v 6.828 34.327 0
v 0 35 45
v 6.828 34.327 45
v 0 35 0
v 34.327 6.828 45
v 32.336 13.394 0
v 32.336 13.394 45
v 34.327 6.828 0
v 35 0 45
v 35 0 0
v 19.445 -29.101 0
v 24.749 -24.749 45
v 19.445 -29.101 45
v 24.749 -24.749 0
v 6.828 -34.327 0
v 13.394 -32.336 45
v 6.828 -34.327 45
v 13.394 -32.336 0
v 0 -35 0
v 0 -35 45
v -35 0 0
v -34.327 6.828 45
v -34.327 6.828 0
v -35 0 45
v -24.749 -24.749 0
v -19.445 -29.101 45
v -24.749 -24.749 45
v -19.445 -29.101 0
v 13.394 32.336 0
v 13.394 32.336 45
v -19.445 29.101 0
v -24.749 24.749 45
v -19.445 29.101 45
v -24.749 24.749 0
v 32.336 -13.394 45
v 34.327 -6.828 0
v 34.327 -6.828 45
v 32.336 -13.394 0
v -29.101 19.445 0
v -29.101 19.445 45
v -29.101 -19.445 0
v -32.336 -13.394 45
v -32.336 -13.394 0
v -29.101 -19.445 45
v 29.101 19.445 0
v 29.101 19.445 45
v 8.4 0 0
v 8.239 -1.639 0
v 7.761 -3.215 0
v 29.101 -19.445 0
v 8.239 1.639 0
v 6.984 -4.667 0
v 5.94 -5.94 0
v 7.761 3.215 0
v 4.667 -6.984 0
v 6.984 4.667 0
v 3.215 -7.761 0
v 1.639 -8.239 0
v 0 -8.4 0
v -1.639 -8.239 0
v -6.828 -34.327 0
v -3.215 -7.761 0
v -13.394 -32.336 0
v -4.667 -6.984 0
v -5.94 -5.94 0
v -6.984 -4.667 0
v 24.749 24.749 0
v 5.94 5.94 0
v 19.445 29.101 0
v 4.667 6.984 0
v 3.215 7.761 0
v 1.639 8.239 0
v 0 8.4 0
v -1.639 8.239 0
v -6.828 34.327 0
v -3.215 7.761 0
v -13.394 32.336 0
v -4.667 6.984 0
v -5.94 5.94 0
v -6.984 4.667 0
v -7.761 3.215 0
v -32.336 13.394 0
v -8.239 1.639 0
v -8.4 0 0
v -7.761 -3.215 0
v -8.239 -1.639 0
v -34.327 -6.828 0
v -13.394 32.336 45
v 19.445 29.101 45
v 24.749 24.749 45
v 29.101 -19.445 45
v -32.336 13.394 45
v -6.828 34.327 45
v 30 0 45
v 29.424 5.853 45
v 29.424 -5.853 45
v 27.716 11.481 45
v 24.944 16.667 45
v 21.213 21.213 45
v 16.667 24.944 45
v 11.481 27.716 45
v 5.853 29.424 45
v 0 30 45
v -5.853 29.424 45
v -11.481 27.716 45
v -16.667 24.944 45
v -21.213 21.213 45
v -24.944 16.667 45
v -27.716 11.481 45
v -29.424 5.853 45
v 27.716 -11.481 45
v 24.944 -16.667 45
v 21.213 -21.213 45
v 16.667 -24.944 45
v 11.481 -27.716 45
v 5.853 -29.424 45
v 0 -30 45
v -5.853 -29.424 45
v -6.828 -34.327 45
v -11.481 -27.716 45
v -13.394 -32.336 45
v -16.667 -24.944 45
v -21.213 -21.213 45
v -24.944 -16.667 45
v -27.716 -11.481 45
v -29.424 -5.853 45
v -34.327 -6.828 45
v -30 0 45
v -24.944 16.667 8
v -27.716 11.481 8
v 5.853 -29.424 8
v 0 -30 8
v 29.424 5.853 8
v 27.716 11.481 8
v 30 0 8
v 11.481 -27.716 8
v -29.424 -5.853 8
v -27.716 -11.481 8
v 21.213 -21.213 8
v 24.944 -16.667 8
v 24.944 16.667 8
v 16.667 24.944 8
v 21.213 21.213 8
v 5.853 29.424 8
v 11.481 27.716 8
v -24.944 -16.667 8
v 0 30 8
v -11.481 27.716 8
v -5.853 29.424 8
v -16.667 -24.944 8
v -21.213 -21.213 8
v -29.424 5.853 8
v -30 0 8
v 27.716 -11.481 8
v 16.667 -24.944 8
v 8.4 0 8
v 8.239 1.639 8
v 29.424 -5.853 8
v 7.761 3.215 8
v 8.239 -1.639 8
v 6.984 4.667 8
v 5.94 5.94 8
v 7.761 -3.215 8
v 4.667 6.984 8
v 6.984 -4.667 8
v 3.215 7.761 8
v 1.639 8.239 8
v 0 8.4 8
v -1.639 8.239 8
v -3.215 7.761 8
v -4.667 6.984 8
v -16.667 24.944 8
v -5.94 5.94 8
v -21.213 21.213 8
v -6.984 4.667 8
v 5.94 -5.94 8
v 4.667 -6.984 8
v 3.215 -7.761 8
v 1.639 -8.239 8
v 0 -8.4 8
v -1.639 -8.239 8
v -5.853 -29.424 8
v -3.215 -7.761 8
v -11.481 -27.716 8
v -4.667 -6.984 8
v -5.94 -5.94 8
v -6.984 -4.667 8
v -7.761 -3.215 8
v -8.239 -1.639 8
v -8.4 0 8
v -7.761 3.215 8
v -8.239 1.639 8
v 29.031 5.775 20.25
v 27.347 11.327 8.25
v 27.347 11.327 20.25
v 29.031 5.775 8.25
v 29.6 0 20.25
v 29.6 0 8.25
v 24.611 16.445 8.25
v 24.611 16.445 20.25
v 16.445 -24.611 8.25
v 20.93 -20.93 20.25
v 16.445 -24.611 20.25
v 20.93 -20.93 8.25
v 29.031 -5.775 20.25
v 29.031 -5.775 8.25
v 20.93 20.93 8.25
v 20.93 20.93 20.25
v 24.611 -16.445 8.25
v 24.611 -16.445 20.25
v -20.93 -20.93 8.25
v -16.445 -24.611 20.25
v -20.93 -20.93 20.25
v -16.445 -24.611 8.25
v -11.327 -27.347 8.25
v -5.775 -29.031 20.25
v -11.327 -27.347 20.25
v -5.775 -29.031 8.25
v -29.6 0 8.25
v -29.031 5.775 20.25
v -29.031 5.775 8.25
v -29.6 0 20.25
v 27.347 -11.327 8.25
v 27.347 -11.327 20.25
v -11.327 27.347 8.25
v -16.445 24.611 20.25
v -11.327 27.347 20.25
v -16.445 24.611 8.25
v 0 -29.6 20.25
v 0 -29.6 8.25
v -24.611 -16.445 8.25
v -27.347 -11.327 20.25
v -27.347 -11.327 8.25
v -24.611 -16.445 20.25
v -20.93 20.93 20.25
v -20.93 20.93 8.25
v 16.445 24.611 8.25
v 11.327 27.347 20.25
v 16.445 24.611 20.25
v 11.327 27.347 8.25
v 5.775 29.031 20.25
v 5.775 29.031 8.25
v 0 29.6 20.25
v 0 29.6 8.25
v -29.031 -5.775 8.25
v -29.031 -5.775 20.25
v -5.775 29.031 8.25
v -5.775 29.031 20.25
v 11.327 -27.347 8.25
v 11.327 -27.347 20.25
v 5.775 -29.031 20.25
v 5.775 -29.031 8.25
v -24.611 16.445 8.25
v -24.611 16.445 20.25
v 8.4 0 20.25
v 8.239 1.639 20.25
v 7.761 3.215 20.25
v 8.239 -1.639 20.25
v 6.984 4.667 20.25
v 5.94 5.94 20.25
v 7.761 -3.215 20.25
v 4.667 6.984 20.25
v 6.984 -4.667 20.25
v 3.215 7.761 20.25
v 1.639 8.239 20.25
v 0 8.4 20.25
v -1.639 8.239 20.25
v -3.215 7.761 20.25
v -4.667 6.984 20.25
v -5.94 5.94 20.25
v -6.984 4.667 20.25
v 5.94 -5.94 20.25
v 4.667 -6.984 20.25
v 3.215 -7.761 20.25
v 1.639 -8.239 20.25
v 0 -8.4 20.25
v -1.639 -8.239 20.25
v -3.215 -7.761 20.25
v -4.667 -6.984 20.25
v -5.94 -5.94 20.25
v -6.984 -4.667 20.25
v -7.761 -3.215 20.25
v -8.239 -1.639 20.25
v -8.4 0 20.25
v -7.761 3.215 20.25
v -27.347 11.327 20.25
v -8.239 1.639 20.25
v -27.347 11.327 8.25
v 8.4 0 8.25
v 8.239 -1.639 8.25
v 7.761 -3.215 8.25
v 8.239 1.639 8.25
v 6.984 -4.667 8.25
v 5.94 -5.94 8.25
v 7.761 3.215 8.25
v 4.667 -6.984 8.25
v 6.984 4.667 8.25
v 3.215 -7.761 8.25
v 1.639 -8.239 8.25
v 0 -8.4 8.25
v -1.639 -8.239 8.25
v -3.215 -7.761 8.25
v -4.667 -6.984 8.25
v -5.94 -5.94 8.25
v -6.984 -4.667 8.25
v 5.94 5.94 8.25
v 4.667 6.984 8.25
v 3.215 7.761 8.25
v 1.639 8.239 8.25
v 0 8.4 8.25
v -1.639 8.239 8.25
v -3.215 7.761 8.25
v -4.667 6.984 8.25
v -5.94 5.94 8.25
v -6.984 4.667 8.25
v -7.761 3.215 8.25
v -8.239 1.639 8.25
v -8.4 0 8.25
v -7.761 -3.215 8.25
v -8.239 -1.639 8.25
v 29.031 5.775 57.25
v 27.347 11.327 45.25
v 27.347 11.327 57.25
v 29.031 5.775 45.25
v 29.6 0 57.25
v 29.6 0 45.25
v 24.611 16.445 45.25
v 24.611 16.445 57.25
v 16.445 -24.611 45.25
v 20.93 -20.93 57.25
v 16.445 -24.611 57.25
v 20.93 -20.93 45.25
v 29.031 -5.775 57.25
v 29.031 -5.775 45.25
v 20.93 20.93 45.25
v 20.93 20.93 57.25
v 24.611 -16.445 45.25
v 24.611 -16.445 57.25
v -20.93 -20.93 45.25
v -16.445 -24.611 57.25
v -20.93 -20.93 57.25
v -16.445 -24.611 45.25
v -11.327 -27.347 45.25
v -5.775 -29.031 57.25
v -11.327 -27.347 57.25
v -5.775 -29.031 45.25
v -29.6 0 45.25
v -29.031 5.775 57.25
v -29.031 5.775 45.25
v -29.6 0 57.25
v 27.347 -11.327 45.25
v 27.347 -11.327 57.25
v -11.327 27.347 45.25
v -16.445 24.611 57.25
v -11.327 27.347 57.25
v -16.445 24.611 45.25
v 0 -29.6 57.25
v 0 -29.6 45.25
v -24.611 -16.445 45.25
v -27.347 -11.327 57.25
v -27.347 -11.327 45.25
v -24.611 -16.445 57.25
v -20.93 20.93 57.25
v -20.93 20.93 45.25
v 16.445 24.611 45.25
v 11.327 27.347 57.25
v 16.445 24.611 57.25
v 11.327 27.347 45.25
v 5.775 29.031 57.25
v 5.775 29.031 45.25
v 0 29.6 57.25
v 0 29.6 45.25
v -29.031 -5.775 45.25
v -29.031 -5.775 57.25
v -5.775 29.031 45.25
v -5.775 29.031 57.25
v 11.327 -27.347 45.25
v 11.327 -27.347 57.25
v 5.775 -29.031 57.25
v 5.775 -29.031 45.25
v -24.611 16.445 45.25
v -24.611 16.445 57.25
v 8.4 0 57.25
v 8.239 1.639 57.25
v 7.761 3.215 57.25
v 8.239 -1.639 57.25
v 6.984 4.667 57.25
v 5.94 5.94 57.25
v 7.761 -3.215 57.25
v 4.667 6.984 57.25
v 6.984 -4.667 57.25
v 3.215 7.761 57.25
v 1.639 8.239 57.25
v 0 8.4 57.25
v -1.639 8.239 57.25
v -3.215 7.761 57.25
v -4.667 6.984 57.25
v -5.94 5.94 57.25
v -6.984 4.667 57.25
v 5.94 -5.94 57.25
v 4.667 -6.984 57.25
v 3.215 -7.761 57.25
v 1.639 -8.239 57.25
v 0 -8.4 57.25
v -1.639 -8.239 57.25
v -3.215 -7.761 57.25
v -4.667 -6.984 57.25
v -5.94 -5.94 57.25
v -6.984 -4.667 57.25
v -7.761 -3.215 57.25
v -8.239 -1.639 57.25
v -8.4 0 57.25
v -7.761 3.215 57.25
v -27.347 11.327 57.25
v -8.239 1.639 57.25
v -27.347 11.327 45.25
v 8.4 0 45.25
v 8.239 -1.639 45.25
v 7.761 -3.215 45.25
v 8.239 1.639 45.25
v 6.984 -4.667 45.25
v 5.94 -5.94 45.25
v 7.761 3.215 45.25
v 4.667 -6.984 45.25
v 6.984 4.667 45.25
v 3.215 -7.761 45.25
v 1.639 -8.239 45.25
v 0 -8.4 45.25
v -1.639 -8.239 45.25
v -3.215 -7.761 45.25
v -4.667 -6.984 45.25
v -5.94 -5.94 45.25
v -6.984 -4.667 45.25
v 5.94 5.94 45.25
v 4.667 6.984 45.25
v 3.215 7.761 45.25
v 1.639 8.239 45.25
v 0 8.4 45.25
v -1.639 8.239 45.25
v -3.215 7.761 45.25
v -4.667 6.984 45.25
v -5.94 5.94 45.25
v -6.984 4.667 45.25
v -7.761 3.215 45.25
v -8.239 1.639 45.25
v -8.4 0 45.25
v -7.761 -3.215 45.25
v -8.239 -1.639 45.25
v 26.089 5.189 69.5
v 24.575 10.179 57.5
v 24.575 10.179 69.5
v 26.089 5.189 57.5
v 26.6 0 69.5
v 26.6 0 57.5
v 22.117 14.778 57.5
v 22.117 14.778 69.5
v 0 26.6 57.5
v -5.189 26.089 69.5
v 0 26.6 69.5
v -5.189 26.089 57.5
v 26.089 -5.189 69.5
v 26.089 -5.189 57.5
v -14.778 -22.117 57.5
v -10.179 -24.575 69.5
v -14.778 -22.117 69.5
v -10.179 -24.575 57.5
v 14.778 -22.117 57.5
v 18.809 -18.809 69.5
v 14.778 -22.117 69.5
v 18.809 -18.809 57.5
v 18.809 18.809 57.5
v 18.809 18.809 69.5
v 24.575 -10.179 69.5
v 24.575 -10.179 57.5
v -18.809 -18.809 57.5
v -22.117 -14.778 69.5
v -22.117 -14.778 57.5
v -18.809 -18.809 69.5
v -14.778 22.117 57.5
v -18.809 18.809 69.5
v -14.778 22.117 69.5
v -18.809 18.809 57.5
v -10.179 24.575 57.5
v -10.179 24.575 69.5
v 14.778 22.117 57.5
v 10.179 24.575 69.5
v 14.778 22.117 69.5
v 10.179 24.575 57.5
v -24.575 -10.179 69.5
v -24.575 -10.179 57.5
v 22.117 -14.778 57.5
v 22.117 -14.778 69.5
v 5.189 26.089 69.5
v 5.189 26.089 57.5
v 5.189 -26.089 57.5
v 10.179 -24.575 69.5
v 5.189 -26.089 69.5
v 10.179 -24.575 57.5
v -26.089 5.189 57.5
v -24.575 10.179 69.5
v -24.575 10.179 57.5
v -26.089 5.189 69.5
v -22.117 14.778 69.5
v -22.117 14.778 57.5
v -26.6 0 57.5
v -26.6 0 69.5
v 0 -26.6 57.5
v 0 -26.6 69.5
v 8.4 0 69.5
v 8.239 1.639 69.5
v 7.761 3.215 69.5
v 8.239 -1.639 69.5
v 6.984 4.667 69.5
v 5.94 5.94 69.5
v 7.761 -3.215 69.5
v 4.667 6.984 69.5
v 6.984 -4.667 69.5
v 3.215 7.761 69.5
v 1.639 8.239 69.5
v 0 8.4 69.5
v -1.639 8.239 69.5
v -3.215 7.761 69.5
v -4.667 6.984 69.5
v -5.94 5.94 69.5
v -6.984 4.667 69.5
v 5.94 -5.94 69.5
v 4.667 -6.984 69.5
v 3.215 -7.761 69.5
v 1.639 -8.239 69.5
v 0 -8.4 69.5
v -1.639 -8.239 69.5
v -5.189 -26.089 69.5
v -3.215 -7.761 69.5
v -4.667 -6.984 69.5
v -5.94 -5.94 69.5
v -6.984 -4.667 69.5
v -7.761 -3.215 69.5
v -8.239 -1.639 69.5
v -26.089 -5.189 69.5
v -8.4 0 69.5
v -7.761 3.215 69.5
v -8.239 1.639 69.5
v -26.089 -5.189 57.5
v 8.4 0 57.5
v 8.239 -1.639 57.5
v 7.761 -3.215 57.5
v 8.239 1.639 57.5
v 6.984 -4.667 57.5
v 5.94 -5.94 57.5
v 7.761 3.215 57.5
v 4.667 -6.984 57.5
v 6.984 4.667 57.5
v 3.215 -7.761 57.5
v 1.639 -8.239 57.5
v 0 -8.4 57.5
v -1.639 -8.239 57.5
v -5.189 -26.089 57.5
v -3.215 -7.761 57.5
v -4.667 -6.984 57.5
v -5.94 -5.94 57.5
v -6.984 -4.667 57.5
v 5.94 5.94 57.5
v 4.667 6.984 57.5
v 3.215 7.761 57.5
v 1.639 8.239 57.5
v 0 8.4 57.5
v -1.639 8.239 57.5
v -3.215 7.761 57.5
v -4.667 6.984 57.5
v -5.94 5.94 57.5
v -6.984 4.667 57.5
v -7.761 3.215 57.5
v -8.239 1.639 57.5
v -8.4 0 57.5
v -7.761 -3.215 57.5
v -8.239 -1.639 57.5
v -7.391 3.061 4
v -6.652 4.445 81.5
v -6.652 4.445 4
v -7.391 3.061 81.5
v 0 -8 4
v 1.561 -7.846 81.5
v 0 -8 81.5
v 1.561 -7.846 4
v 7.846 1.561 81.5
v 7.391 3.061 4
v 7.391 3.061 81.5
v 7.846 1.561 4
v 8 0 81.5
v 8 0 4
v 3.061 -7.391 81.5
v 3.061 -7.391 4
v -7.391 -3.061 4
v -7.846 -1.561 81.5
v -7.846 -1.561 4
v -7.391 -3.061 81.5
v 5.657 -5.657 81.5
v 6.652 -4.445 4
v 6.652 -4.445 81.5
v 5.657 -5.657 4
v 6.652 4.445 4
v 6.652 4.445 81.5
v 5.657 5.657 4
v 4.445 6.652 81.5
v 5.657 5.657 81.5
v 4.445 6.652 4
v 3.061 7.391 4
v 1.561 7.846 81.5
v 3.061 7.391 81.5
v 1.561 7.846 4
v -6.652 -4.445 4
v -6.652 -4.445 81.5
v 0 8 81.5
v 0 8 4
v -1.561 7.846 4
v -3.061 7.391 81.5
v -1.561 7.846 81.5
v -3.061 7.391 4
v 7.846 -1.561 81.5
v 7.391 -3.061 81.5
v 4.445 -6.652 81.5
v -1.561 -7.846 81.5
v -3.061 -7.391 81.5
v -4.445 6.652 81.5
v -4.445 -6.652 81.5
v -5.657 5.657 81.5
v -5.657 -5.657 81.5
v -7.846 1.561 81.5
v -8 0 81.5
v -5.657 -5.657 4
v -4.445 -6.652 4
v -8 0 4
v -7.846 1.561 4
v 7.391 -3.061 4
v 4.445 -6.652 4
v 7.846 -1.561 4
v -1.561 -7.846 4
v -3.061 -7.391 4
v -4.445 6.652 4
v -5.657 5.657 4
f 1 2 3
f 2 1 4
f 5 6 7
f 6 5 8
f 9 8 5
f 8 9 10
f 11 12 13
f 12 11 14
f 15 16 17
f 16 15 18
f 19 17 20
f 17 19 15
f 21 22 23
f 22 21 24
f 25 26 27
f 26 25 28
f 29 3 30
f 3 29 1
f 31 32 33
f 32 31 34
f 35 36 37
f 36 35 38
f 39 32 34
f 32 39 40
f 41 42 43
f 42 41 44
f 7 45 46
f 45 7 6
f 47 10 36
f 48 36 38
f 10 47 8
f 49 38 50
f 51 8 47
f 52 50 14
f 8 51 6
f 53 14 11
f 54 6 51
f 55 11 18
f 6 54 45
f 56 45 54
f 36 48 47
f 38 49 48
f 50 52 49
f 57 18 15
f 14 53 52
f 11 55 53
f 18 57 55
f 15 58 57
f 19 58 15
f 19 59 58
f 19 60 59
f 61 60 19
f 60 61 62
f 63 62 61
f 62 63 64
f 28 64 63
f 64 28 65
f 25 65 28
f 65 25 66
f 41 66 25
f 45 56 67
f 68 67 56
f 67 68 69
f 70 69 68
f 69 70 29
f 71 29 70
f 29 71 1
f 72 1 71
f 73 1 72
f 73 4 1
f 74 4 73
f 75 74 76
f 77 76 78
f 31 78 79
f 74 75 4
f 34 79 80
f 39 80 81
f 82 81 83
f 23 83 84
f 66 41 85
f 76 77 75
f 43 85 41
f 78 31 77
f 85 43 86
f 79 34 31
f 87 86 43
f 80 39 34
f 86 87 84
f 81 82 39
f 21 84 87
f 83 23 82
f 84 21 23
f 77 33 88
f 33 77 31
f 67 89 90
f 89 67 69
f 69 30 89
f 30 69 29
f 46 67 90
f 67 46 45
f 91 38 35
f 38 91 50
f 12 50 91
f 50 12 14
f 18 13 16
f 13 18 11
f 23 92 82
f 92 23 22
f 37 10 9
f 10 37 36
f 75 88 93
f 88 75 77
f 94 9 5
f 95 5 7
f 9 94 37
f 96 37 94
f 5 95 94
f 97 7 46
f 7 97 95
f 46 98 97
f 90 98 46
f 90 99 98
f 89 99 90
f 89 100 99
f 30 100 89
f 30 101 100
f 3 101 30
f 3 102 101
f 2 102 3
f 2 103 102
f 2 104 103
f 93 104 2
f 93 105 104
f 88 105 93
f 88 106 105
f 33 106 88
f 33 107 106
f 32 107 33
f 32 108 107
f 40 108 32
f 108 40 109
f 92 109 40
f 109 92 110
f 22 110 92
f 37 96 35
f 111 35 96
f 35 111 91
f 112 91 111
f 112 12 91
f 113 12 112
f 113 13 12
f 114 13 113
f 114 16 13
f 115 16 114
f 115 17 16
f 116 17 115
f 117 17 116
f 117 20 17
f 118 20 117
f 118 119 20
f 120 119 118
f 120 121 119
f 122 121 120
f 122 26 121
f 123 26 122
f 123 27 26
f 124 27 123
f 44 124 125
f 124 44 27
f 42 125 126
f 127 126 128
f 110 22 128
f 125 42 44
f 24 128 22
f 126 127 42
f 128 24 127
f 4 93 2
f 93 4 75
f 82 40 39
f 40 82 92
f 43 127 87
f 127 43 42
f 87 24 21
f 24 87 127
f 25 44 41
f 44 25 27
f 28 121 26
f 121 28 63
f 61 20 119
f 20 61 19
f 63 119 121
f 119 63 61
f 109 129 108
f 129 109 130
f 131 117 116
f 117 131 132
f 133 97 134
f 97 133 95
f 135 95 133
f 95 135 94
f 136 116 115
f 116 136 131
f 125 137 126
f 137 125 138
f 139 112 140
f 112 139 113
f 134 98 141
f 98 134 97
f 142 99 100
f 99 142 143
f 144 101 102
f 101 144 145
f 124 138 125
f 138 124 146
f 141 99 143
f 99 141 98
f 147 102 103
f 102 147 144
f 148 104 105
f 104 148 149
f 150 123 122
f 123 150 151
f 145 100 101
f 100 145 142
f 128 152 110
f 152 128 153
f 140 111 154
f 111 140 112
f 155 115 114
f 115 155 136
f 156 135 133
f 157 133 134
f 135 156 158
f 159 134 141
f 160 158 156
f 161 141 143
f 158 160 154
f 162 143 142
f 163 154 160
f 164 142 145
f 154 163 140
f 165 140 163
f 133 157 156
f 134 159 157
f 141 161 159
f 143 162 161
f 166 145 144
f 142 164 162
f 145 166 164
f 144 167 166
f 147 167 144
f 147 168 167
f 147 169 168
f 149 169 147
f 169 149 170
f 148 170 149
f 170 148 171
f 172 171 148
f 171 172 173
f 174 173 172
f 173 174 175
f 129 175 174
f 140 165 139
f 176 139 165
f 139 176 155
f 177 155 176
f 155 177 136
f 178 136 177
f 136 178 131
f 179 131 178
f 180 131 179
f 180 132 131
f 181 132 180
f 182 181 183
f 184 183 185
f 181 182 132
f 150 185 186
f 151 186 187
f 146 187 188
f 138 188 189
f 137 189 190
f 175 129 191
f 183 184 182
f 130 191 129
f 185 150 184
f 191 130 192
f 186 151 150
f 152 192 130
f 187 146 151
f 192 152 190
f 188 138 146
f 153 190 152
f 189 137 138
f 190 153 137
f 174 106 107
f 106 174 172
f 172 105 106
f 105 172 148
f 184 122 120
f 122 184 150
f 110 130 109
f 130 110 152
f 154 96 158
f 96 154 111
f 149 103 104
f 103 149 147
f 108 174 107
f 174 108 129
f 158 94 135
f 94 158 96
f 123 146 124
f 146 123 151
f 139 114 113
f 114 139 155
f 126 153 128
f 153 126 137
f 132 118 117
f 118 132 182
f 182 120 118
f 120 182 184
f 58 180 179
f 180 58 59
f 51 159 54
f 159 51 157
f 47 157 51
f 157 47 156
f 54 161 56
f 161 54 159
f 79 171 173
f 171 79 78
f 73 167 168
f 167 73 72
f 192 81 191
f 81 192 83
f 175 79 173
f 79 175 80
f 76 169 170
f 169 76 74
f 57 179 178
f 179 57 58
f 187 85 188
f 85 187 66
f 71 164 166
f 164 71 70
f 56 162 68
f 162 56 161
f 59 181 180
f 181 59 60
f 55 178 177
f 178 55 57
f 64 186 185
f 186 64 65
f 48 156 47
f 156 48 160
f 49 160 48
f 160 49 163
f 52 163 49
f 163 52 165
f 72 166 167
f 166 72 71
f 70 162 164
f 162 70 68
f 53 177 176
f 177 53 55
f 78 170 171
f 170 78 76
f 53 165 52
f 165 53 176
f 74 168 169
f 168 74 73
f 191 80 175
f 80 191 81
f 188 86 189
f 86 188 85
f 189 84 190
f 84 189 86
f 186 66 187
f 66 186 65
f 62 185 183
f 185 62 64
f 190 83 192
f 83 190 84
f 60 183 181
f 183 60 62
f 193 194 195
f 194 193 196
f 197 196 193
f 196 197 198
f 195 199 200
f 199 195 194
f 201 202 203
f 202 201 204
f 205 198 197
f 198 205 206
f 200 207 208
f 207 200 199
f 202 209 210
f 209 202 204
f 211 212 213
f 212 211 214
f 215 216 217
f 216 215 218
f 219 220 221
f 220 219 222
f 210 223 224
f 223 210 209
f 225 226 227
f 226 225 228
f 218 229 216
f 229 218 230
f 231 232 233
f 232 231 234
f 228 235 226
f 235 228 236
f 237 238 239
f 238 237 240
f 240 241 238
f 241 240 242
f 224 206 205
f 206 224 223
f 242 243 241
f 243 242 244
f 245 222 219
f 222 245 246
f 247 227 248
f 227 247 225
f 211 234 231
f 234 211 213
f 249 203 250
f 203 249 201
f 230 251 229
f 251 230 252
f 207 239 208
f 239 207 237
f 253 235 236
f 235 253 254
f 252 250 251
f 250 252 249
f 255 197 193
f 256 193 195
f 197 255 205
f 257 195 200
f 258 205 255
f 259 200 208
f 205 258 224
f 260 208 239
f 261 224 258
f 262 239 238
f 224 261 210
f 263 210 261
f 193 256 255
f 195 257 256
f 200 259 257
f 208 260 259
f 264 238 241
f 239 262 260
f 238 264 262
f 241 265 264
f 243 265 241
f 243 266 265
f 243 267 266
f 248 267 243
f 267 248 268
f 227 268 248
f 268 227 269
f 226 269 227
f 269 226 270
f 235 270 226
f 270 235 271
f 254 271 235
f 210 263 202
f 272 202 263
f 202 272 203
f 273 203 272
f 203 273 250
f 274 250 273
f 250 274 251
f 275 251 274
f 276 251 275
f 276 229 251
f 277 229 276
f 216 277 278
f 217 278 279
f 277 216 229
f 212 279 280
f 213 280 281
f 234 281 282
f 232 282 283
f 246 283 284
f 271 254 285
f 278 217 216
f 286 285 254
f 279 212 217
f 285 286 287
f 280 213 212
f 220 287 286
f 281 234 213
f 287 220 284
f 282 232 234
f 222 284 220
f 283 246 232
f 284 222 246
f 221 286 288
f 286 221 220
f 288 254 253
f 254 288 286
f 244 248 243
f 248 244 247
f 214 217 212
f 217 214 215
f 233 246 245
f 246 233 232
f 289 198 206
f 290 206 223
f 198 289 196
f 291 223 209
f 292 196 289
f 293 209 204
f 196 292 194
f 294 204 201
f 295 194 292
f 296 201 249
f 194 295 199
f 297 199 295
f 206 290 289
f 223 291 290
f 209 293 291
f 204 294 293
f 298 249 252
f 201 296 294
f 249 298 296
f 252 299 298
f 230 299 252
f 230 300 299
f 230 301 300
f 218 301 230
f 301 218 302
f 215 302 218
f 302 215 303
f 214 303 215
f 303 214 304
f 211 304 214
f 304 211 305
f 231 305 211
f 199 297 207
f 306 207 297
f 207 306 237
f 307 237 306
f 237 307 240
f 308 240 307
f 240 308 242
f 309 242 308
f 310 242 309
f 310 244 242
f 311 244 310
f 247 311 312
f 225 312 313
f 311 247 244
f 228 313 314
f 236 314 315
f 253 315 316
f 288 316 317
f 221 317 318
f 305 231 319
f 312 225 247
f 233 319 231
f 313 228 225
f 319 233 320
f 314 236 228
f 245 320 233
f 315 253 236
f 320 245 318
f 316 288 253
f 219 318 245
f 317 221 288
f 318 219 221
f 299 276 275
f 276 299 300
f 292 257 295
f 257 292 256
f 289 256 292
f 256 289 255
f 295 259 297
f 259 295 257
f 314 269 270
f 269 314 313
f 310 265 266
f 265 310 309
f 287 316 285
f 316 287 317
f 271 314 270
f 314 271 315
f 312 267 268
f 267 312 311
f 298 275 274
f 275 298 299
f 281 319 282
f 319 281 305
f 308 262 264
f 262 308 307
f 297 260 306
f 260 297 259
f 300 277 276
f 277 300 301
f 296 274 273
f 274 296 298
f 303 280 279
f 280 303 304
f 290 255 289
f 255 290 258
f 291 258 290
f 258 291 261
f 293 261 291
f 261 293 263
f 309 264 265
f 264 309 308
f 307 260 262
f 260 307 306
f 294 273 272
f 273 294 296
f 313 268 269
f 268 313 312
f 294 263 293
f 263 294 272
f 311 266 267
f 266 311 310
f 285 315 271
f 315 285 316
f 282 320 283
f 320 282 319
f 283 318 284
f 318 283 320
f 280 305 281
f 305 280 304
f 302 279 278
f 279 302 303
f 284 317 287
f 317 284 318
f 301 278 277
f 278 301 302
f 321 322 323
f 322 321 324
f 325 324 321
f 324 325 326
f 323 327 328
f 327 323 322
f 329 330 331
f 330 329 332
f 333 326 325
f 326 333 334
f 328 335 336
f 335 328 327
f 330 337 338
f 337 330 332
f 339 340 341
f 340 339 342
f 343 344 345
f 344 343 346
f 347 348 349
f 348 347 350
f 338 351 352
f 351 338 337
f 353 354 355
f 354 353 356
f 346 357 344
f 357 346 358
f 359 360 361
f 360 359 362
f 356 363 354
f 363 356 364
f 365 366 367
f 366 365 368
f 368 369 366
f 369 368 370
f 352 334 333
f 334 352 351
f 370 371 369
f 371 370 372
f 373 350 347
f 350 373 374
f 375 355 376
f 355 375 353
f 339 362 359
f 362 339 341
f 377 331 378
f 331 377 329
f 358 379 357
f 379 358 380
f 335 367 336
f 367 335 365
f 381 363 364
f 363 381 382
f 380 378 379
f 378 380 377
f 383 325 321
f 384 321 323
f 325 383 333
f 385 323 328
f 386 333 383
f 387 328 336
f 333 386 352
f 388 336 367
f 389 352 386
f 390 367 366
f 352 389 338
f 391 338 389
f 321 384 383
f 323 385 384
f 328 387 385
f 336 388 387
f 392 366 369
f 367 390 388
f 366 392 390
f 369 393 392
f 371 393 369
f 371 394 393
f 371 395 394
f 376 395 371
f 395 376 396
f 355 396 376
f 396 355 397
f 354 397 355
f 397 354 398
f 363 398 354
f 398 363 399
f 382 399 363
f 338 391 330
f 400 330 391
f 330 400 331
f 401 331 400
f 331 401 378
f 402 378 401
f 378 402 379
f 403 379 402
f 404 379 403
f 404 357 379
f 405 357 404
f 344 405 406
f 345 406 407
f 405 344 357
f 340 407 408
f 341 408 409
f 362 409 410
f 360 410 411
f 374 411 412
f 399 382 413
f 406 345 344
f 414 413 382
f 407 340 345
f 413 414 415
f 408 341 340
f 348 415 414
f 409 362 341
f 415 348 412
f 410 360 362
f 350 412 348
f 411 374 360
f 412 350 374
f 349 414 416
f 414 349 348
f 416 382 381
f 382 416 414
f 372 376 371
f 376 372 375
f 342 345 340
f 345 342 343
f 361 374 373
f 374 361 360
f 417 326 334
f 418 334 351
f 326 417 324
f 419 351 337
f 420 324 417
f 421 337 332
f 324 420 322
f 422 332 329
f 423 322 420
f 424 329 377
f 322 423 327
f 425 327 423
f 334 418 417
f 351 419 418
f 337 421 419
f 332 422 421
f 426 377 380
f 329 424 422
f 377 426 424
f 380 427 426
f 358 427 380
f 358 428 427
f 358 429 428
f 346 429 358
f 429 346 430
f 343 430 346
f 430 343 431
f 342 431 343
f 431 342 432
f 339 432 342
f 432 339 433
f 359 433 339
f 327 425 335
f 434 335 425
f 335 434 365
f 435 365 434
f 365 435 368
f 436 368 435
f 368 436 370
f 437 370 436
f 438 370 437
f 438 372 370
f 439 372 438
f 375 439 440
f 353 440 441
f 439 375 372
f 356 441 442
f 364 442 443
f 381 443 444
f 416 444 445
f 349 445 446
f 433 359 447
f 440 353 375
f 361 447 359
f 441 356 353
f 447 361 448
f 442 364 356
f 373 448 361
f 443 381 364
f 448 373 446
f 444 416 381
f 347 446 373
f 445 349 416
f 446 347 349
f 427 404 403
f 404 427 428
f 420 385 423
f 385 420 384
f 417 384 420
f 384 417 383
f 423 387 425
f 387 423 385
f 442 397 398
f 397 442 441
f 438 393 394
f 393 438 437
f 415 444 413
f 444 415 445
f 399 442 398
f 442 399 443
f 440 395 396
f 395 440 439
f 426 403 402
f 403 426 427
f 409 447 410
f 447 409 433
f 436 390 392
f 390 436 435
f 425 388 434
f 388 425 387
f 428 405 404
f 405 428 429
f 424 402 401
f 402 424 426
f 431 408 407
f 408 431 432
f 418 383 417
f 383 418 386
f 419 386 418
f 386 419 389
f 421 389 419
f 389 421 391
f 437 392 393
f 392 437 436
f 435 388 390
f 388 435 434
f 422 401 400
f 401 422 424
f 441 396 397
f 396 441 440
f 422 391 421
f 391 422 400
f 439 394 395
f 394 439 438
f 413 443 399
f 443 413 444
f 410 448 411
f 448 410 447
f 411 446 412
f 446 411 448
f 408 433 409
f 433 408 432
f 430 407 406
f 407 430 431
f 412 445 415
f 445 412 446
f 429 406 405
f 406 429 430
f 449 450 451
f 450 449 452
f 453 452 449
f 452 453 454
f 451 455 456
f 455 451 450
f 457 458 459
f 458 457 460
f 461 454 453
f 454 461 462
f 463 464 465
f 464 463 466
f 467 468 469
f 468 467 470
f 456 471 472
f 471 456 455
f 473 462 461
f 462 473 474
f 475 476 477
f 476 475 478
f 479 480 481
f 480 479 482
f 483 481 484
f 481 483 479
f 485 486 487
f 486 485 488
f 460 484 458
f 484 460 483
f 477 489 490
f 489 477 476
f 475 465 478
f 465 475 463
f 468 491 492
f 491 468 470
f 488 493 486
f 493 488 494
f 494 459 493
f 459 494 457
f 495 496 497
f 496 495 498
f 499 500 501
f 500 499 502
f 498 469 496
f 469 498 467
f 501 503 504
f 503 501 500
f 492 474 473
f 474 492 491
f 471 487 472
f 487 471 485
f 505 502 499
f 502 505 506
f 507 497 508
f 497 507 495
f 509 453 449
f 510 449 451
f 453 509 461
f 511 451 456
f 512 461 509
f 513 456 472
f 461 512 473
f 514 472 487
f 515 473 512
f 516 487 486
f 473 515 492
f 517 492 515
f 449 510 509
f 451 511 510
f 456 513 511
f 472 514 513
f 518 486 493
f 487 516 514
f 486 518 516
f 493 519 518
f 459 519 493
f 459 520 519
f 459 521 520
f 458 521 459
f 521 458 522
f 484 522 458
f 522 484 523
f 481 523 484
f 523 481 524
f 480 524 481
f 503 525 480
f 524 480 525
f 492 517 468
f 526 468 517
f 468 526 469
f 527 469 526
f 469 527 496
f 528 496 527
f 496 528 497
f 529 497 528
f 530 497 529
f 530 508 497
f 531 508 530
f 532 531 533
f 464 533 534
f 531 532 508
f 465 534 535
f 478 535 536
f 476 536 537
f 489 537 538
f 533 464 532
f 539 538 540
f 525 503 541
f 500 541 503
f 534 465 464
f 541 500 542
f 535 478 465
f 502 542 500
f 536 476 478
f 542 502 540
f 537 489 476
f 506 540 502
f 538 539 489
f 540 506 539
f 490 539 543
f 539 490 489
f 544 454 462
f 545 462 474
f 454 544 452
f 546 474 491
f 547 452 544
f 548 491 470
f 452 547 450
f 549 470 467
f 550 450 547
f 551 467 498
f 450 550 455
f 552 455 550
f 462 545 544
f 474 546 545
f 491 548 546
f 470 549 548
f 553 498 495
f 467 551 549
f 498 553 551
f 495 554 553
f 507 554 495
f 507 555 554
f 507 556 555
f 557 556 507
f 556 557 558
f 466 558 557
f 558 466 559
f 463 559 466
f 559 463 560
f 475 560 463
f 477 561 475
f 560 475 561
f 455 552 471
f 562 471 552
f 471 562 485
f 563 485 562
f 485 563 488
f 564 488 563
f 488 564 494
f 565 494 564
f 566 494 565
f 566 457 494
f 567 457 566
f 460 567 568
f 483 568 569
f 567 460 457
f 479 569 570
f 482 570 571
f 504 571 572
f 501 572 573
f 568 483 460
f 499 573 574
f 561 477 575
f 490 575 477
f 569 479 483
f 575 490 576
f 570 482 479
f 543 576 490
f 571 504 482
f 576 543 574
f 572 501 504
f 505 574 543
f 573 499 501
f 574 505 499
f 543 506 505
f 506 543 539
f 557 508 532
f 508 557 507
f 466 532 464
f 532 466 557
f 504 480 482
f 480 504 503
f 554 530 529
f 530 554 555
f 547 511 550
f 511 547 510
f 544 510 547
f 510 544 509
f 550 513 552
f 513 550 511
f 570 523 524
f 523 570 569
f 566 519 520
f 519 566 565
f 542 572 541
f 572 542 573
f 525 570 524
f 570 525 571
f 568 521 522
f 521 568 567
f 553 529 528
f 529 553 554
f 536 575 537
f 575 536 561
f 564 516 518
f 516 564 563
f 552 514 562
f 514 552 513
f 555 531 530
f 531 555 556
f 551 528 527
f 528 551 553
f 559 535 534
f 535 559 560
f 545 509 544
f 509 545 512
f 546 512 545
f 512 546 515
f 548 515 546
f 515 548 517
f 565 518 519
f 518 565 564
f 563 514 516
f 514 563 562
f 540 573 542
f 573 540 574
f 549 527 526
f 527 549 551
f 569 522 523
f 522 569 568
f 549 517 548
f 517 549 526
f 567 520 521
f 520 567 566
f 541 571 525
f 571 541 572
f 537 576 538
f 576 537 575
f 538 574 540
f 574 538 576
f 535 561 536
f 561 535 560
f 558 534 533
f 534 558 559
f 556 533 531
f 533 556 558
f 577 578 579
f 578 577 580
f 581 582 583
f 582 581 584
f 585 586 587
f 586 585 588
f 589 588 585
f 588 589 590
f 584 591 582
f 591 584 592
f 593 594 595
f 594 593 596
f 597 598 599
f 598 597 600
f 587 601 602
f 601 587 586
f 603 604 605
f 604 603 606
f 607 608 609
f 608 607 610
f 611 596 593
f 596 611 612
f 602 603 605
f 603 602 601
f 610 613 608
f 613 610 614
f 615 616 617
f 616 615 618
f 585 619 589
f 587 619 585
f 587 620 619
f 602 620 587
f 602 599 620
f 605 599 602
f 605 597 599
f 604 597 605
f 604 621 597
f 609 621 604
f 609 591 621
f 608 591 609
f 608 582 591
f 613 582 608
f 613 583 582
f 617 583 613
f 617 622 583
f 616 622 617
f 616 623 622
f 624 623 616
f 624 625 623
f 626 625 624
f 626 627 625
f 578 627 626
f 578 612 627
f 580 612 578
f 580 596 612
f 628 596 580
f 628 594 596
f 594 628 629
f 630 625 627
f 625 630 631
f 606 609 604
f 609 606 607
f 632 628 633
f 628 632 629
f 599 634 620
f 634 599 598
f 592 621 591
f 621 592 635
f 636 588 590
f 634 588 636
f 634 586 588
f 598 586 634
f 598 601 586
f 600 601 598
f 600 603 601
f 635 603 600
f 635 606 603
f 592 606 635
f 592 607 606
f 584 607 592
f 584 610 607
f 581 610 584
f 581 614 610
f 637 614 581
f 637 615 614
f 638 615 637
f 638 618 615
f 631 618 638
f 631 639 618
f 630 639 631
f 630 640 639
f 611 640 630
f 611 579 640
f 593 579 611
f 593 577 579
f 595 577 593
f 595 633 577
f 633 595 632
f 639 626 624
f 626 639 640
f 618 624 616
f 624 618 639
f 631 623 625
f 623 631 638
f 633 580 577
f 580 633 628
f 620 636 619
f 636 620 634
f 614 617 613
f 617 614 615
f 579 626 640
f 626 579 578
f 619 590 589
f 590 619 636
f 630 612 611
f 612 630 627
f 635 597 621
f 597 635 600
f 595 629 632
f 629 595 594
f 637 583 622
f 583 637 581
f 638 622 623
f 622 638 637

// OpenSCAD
$fn = 32;

// ------------------------------------------------------------------------
// Bearing housing: housing d70, two bearings and a shaft
// Every part is its own module, assembly() places them once.
// ------------------------------------------------------------------------

// --- part 1 ---
module housing() {
  difference() {
    cylinder(h = 45, d = 70);
    translate([0, 0, 8]) cylinder(h = 38, d = 60);
    translate([0, 0, -1]) cylinder(h = 10, d = 16.8);
  }
}

// --- part 2 ---
module bearing_lower() {
  difference() {
      translate([0, 0, 0]) cylinder(h = 12, d = 59.2);
      translate([0, 0, -1]) cylinder(h = 14, d = 16.8);
    }
}

// --- part 3 ---
module bearing_upper() {
  difference() {
      translate([0, 0, 0]) cylinder(h = 12, d = 59.2);
      translate([0, 0, -1]) cylinder(h = 14, d = 16.8);
    }
}

// --- part 4 ---
module spacer() {
  difference() {
      translate([0, 0, 0]) cylinder(h = 12, d = 53.2);
      translate([0, 0, -1]) cylinder(h = 14, d = 16.8);
    }
}

// --- part 5 ---
module shaft() {
  translate([0, 0, -38.75]) cylinder(h = 77.5, d = 16);
}

// --- assembly ---
module assembly() {
  translate([0, 0, 0]) rotate([0, 0, 0]) housing();
  translate([0, 0, 8.25]) rotate([0, 0, 0]) bearing_lower();
  translate([0, 0, 45.25]) rotate([0, 0, 0]) bearing_upper();
  translate([0, 0, 57.5]) rotate([0, 0, 0]) spacer();
  translate([0, 0, 42.75]) rotate([0, 0, 0]) shaft();
}

assembly();
